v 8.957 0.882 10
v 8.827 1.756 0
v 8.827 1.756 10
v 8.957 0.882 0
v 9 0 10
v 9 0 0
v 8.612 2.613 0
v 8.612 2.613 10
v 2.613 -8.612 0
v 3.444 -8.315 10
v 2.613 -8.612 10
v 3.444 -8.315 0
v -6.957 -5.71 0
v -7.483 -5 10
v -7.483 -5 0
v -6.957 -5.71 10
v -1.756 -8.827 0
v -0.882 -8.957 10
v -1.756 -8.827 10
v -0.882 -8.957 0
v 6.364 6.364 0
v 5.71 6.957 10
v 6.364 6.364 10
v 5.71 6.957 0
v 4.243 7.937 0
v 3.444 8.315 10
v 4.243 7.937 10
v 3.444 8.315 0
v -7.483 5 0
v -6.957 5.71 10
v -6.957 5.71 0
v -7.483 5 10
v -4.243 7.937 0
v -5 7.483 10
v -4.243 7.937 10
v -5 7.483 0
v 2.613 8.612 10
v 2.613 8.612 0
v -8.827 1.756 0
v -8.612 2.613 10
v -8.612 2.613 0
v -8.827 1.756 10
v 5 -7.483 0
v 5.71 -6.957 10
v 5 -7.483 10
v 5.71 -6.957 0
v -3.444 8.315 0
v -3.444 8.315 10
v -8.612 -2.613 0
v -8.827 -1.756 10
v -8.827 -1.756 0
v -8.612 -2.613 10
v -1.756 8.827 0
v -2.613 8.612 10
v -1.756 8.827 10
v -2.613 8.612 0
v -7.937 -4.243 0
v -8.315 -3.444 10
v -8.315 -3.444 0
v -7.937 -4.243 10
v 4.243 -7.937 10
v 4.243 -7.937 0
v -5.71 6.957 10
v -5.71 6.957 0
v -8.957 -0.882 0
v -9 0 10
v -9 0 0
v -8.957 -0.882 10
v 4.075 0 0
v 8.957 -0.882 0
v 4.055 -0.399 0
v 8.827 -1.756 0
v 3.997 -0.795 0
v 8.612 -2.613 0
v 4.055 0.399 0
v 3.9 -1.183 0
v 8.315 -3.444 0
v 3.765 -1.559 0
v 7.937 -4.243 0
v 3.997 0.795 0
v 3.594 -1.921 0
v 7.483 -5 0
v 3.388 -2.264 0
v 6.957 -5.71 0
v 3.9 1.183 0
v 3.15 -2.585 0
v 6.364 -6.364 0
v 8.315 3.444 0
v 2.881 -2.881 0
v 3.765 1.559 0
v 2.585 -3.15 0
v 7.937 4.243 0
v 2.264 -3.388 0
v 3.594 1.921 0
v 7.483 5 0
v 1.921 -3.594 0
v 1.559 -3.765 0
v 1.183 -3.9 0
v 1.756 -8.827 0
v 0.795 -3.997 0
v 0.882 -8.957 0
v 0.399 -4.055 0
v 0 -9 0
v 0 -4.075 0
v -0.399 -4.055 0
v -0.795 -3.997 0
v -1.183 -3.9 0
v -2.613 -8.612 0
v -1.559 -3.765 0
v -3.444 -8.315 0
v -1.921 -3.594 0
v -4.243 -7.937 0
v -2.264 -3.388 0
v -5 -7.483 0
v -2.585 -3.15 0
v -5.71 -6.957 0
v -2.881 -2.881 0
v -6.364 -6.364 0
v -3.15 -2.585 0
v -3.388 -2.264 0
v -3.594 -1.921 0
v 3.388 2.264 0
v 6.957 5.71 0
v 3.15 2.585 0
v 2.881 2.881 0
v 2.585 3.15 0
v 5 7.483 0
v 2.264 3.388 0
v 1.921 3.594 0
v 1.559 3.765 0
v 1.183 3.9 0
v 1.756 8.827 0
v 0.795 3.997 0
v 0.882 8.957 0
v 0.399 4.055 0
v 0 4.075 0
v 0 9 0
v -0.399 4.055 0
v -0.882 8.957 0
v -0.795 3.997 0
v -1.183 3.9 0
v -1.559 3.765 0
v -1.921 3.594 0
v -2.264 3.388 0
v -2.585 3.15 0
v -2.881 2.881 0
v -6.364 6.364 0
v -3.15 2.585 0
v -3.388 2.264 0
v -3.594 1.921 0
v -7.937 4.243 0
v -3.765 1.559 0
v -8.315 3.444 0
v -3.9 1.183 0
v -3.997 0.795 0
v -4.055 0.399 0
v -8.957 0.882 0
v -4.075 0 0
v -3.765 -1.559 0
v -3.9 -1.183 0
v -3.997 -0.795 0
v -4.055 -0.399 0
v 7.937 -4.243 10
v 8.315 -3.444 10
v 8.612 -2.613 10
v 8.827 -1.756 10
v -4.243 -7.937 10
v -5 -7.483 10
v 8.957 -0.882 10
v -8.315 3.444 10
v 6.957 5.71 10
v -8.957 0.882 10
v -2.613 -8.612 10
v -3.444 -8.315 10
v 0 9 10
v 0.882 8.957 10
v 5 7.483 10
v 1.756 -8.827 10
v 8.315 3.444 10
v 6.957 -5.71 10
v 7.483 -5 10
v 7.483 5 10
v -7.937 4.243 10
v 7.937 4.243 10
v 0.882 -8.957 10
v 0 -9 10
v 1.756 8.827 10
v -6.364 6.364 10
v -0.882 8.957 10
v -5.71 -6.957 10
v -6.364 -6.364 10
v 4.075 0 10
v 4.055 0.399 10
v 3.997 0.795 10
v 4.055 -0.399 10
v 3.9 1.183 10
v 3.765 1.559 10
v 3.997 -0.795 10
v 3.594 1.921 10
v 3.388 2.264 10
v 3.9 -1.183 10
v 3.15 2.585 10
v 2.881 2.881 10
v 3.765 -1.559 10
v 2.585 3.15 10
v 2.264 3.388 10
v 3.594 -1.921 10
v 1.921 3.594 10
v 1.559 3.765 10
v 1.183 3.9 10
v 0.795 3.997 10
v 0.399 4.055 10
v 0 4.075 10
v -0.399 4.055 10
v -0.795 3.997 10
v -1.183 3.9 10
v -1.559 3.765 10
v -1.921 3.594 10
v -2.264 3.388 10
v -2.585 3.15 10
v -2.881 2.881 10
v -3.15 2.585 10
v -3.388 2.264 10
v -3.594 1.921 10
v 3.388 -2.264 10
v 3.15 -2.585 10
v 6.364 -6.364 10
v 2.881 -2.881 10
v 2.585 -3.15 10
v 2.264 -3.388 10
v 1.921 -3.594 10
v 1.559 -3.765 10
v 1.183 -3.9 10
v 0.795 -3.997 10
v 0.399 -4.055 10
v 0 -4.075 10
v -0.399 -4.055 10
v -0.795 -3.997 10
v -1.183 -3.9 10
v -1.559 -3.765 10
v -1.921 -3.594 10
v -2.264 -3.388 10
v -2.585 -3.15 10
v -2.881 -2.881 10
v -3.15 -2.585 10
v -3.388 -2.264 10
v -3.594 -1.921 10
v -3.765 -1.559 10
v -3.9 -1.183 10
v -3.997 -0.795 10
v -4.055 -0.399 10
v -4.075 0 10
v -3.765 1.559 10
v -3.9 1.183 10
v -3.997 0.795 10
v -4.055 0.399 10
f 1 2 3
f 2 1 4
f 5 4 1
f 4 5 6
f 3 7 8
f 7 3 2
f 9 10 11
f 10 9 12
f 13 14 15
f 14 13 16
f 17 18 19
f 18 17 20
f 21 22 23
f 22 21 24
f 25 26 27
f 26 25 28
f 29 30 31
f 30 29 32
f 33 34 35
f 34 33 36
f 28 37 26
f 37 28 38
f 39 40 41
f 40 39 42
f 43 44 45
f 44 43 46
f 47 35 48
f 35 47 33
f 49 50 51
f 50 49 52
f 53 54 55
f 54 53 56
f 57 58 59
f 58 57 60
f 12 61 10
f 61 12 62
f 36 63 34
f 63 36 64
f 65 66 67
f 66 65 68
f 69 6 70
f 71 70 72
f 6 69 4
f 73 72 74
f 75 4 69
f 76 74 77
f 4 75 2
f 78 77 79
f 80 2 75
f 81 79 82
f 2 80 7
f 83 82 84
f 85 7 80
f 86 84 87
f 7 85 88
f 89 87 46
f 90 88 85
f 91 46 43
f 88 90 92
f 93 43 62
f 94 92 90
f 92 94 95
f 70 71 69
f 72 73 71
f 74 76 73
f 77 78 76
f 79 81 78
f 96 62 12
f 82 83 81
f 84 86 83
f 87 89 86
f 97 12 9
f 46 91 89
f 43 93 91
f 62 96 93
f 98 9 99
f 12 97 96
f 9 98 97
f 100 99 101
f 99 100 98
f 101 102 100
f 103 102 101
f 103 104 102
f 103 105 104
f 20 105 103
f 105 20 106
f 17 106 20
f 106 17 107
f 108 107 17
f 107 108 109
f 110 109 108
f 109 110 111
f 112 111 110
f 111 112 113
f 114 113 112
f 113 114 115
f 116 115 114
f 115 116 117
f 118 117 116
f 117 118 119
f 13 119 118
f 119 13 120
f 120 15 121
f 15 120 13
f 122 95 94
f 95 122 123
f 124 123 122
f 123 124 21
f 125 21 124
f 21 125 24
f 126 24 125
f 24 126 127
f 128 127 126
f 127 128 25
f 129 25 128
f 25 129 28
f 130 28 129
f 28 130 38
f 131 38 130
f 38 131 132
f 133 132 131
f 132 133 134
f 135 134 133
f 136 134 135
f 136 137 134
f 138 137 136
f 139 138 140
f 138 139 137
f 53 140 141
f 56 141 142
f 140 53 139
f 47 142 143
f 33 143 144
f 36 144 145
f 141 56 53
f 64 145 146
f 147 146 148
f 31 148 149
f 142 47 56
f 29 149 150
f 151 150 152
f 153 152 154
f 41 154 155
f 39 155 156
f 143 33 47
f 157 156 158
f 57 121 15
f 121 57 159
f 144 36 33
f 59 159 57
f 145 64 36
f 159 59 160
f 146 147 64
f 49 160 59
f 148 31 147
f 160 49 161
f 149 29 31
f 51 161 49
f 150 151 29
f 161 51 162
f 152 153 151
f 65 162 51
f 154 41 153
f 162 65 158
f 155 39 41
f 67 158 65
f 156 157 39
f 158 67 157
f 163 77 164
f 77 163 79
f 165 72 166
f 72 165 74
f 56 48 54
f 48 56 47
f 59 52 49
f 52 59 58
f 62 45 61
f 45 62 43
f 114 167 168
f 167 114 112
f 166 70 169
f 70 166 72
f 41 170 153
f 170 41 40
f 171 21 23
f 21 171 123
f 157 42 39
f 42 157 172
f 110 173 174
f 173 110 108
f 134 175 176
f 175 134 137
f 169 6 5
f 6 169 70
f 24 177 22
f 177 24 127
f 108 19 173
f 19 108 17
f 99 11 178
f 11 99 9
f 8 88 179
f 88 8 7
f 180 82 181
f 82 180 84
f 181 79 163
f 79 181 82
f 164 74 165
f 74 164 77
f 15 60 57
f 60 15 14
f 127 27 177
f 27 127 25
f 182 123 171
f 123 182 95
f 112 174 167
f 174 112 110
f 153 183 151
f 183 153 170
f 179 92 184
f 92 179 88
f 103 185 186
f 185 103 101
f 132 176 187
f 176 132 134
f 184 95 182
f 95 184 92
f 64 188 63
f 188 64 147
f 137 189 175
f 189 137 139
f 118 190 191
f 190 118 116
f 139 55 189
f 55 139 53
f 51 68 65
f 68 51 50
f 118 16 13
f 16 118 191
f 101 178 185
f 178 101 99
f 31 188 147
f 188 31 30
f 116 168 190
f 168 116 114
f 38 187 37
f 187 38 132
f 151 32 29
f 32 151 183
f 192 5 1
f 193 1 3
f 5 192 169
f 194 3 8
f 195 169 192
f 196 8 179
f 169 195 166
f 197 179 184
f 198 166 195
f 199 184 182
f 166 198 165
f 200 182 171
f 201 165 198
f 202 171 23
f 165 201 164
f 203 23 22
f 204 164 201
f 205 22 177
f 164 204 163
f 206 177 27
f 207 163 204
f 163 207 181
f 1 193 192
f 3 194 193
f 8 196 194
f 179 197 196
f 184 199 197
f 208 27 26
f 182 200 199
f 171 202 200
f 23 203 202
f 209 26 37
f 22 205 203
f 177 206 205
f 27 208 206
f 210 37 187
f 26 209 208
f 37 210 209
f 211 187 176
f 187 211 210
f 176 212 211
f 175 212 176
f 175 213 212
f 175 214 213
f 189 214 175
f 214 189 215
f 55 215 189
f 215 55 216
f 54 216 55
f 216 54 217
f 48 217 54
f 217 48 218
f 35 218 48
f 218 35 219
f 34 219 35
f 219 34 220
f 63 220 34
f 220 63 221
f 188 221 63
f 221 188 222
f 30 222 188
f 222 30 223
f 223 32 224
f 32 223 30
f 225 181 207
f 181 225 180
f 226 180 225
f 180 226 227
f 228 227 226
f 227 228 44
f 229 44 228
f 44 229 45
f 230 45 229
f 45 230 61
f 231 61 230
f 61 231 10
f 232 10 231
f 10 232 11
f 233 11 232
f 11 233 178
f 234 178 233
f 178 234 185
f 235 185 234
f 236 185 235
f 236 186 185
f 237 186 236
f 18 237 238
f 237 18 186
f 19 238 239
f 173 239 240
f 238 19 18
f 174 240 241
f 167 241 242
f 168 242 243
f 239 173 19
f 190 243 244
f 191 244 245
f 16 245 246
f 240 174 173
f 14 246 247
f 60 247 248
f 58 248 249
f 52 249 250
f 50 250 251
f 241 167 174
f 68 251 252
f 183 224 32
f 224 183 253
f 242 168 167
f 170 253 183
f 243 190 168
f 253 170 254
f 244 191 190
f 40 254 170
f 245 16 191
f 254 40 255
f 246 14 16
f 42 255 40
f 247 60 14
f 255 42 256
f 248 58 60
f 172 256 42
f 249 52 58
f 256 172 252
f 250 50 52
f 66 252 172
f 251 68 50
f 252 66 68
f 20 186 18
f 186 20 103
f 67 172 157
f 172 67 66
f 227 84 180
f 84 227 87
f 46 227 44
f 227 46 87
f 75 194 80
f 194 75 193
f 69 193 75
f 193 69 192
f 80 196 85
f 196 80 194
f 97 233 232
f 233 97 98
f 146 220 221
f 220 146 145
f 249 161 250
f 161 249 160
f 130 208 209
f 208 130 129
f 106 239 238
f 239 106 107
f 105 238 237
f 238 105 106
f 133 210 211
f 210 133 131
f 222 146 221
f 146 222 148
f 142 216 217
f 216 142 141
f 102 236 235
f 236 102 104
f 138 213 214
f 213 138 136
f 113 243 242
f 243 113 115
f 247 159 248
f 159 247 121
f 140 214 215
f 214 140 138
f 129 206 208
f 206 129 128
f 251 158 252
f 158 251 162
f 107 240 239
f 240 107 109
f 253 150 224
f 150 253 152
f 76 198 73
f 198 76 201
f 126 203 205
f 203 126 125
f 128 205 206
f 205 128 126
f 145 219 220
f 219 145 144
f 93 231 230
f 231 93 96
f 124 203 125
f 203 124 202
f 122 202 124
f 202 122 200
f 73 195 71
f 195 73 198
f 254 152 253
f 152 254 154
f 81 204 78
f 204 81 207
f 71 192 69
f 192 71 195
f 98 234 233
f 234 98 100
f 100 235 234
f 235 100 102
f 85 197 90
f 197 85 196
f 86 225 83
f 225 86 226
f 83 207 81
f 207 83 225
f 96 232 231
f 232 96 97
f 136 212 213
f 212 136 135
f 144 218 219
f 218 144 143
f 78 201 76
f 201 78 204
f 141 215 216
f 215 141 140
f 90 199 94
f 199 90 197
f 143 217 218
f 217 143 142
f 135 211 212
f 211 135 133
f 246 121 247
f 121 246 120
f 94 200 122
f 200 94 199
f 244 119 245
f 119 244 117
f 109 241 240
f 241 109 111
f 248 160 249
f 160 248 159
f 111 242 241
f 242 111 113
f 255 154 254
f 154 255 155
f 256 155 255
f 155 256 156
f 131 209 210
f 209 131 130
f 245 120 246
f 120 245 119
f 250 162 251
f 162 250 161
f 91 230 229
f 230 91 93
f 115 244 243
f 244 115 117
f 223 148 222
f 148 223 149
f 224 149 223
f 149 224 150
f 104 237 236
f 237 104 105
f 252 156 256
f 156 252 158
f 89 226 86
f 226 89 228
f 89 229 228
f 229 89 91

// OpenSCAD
$fn=64; shaft=8.15; mag=6.15;
difference(){cylinder(h=10,d=18);translate([0,0,-1])cylinder(h=12,d=shaft);translate([0,0,6])cylinder(h=5,d=mag);}
